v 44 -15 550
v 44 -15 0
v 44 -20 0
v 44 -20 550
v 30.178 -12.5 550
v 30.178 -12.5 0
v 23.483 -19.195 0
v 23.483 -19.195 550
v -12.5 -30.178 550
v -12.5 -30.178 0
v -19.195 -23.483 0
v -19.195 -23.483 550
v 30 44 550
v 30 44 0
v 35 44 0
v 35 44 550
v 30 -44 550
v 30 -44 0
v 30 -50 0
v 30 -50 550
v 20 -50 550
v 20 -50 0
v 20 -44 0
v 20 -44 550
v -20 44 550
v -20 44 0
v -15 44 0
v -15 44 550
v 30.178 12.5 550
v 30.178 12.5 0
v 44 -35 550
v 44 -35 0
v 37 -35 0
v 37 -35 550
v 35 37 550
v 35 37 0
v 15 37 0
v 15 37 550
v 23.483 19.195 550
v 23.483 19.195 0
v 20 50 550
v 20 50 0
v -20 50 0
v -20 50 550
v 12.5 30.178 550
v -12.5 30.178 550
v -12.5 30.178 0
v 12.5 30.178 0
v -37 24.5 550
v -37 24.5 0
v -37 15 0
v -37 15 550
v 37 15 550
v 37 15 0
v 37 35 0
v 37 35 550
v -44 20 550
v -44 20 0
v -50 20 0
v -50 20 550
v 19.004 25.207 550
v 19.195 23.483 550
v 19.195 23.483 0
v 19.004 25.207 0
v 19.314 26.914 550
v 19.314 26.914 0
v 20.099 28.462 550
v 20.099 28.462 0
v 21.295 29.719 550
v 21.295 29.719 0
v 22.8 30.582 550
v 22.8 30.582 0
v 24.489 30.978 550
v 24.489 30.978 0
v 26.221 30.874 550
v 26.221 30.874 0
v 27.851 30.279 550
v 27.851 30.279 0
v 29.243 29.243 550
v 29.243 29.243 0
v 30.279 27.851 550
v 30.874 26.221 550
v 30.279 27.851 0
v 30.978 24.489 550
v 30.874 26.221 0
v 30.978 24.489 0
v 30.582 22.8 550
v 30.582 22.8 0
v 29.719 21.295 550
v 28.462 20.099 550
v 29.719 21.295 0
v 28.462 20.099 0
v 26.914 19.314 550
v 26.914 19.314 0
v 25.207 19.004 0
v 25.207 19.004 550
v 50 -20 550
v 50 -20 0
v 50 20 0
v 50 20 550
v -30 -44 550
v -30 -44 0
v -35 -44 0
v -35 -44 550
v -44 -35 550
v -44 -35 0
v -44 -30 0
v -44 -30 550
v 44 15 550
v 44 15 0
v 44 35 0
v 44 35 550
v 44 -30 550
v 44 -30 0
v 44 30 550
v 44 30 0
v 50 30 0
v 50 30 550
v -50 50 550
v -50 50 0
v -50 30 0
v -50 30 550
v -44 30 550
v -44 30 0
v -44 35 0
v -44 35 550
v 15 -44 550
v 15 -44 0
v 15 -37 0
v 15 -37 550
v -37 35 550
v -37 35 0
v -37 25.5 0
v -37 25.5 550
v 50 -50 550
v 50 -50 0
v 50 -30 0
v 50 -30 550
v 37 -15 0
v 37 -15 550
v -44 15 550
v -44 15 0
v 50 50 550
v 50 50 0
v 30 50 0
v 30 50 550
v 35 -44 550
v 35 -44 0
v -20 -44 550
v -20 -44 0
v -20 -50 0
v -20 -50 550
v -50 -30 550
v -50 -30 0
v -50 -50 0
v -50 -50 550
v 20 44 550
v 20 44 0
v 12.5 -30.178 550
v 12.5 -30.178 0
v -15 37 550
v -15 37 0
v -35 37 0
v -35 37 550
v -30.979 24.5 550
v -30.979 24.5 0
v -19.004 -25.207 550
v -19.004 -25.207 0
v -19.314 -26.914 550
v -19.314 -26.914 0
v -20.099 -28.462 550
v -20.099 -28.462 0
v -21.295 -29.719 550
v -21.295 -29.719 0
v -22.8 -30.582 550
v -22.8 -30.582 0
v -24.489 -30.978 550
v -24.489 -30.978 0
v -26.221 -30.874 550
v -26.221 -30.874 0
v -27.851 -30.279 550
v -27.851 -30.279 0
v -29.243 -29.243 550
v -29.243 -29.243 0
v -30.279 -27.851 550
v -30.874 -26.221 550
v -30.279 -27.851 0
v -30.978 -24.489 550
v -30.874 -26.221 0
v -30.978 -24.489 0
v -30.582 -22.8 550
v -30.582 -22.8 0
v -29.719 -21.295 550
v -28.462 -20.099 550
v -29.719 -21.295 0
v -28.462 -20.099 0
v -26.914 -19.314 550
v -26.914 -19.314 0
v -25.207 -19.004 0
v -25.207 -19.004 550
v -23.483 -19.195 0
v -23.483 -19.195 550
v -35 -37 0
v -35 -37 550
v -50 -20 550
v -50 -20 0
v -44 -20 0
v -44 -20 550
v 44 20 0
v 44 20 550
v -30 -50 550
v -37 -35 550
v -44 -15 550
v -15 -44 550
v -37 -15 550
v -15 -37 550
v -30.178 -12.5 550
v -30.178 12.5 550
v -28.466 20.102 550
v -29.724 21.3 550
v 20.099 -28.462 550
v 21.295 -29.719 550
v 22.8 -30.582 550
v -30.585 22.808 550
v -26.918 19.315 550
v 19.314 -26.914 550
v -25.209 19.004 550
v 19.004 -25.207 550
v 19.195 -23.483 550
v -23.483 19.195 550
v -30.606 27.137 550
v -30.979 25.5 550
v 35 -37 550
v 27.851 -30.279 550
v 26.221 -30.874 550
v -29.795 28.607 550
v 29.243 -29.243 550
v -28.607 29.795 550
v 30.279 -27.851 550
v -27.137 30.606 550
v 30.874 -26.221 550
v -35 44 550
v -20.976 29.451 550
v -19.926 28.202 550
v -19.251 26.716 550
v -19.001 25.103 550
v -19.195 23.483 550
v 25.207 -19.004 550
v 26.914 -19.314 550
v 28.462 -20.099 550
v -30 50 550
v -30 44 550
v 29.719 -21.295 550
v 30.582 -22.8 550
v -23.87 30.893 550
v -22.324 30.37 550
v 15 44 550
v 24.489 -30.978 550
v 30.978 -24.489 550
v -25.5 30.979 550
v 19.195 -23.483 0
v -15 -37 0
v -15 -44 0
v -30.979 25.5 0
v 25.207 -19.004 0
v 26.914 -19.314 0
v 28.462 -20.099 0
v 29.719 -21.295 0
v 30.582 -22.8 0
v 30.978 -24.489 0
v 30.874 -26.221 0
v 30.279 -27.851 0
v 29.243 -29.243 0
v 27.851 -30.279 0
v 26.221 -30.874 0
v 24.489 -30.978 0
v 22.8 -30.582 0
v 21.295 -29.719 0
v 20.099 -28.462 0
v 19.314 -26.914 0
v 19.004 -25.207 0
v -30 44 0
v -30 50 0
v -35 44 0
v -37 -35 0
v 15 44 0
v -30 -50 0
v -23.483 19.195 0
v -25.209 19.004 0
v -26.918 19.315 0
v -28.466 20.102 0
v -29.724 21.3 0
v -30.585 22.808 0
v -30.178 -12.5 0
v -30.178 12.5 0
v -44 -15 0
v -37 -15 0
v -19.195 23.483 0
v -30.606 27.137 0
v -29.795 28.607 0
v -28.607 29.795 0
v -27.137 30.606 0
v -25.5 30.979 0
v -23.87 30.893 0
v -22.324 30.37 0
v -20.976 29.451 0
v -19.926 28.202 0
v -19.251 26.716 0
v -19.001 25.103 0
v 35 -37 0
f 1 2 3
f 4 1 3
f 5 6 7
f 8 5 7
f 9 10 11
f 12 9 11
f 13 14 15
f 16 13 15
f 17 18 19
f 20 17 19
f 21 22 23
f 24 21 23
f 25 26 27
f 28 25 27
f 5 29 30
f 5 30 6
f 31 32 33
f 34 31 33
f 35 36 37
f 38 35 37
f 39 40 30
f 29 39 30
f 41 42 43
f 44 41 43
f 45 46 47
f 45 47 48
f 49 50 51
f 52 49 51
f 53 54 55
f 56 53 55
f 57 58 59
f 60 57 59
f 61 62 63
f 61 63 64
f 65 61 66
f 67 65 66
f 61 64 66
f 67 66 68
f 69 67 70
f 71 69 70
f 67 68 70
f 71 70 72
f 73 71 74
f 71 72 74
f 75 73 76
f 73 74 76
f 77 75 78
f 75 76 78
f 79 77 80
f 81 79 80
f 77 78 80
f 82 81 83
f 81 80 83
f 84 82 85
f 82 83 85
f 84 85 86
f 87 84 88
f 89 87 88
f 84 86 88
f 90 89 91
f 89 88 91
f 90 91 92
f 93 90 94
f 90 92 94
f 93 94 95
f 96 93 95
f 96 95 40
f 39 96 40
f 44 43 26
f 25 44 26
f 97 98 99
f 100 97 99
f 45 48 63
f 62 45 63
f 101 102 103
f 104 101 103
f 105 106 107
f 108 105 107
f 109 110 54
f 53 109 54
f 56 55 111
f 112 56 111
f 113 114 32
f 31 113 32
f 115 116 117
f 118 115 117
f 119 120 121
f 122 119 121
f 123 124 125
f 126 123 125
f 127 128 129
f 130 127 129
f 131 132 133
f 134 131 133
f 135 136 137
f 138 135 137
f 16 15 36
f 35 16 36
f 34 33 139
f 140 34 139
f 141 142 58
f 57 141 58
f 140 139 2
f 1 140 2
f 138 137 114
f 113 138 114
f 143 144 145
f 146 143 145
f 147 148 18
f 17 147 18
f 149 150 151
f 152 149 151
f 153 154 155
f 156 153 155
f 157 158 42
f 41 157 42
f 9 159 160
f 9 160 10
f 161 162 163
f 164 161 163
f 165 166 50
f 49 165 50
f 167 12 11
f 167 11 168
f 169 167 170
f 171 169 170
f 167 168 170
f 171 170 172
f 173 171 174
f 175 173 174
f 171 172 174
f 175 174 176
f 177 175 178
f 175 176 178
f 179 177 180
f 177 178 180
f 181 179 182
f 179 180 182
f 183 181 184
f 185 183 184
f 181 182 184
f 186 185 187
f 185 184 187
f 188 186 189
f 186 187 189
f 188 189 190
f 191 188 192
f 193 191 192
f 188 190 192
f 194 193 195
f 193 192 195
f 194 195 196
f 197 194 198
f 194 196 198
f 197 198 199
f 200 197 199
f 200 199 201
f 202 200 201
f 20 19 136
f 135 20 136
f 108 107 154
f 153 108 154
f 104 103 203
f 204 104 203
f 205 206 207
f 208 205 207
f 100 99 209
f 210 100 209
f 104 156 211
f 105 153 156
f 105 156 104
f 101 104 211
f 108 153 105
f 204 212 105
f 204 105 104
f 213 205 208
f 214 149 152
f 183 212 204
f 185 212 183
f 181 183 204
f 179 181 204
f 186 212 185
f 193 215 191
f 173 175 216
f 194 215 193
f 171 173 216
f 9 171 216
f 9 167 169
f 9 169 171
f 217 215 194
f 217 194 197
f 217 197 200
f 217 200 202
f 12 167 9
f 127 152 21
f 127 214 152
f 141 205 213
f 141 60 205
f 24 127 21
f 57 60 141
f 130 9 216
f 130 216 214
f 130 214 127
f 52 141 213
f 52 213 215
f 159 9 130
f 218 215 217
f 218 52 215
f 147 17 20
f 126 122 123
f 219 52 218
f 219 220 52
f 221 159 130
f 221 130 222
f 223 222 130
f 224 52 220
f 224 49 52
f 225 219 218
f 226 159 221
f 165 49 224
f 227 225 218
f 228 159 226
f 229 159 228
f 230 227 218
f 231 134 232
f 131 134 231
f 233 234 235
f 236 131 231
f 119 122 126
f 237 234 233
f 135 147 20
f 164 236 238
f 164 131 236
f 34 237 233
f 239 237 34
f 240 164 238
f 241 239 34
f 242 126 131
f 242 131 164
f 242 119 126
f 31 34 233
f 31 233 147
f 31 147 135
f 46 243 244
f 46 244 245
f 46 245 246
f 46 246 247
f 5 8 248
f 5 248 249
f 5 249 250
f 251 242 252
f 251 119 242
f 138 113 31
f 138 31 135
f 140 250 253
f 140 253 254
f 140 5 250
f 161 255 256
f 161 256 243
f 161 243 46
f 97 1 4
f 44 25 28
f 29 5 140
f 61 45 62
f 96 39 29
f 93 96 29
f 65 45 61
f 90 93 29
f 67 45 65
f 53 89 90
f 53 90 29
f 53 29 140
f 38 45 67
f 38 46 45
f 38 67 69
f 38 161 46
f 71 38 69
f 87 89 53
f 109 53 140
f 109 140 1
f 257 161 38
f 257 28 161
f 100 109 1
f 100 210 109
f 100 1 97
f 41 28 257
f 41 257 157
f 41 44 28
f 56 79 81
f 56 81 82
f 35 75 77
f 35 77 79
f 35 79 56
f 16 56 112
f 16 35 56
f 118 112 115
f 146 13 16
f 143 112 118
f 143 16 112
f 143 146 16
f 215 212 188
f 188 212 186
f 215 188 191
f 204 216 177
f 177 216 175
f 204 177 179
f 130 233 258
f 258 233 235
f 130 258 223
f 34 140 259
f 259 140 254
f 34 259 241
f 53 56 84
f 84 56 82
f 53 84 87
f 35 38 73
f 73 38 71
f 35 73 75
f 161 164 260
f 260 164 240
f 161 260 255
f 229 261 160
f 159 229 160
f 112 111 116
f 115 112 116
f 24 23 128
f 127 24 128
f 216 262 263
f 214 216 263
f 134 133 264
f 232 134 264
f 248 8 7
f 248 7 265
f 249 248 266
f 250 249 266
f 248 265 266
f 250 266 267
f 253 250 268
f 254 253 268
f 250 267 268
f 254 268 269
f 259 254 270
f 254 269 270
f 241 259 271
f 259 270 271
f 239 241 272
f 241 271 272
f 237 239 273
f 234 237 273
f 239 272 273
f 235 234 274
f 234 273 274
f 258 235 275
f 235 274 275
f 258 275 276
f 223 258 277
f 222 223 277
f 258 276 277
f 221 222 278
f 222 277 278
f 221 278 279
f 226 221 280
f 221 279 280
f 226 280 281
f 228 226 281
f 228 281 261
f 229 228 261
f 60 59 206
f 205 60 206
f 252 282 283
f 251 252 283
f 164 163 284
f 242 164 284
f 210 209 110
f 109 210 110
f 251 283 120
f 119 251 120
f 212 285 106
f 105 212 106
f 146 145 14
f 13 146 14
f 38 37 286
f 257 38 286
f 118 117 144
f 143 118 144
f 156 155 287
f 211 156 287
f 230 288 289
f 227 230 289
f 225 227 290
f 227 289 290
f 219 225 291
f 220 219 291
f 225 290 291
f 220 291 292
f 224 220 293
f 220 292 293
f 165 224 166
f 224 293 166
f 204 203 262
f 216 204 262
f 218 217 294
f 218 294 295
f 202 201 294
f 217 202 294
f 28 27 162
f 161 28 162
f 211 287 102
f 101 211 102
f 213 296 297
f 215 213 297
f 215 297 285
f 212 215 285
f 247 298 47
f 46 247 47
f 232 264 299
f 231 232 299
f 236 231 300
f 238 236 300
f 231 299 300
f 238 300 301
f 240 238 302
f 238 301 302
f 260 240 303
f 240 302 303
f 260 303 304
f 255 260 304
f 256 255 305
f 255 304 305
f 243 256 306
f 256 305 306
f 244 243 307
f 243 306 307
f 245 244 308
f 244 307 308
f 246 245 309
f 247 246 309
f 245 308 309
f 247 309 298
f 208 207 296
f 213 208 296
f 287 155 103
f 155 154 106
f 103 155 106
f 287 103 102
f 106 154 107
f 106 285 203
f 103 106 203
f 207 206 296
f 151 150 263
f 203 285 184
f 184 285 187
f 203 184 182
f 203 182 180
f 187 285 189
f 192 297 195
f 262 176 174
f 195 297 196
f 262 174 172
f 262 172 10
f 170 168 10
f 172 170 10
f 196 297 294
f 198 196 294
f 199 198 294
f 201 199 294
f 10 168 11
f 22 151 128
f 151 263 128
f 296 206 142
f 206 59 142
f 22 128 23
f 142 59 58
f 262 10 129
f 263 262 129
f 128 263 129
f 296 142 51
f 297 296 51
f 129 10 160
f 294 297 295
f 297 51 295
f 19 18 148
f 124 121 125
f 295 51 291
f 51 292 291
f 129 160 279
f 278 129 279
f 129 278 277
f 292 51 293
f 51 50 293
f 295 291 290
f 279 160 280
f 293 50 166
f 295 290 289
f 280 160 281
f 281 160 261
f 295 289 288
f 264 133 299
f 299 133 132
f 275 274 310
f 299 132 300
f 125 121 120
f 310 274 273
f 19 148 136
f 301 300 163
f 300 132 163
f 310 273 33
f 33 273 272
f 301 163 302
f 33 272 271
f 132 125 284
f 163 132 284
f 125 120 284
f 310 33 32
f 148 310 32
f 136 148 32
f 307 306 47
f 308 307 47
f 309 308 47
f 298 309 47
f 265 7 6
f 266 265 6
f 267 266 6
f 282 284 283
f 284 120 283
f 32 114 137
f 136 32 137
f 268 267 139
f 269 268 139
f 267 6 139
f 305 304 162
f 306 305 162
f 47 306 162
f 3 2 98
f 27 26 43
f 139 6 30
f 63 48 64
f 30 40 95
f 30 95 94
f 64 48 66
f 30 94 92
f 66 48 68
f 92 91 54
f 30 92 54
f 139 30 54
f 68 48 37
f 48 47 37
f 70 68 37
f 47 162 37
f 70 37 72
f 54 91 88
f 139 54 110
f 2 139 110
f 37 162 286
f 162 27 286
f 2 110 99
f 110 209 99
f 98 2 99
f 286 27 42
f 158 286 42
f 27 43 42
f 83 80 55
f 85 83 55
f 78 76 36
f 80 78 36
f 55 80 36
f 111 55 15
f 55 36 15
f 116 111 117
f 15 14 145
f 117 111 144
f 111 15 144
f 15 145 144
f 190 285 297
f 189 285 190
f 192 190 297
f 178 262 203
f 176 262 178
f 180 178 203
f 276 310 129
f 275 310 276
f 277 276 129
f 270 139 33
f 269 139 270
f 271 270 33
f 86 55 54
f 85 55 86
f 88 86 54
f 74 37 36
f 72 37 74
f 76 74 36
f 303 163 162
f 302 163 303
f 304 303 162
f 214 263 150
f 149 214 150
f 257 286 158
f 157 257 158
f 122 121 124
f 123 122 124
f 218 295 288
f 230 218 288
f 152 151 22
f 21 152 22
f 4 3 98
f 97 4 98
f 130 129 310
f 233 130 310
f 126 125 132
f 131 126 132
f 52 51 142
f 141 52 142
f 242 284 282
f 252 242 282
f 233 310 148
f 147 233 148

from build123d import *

# Parameters (mm, degrees)
F1_DEPTH = 550


with BuildPart() as f1:
    # F0 (on Top) → F1 (new body)
    with BuildSketch(Plane.XY):
        with BuildLine():
            Line((-30, 50), (-50, 50))
            Line((-50, 50), (-50, 30))
            Line((-50, 30), (-44, 30))
            Line((-44, 30), (-44, 35))
            Line((-44, 35), (-37, 35))
            Line((-37, 35), (-37, 25.5))
            Line((-37, 25.5), (-30.97913, 25.5))
            ThreePointArc((-30.97913, 25.5), (-29.242641, 29.242641), (-25.5, 30.97913))
            ThreePointArc((-25.5, 30.97913), (-20.408156, 28.861991), (-19.195037, 23.482633))
            Line((-19.195037, 23.482633), (-12.5, 30.17767))
            Line((-12.5, 30.17767), (12.5, 30.17767))
            Line((12.5, 30.17767), (19.195037, 23.482633))
            ThreePointArc((19.195037, 23.482633), (29.242641, 29.242641), (23.482633, 19.195037))
            Line((23.482633, 19.195037), (30.17767, 12.5))
            Line((30.17767, 12.5), (30.17767, -12.5))
            Line((30.17767, -12.5), (23.482633, -19.195037))
            ThreePointArc((23.482633, -19.195037), (29.242641, -29.242641), (19.195037, -23.482633))
            Line((19.195037, -23.482633), (12.5, -30.17767))
            Line((12.5, -30.17767), (-12.5, -30.17767))
            Line((-12.5, -30.17767), (-19.195037, -23.482633))
            ThreePointArc((-19.195037, -23.482633), (-29.242641, -29.242641), (-23.482633, -19.195037))
            Line((-23.482633, -19.195037), (-30.17767, -12.5))
            Line((-30.17767, -12.5), (-30.17767, 12.5))
            Line((-30.17767, 12.5), (-23.482633, 19.195037))
            ThreePointArc((-23.482633, 19.195037), (-28.465904, 20.102295), (-30.97913, 24.5))
            Line((-30.97913, 24.5), (-37, 24.5))
            Line((-37, 24.5), (-37, 15))
            Line((-37, 15), (-44, 15))
            Line((-44, 15), (-44, 20))
            Line((-44, 20), (-50, 20))
            Line((-50, 20), (-50, -20))
            Line((-50, -20), (-44, -20))
            Line((-44, -20), (-44, -15))
            Line((-44, -15), (-37, -15))
            Line((-37, -15), (-37, -35))
            Line((-37, -35), (-44, -35))
            Line((-44, -35), (-44, -30))
            Line((-44, -30), (-50, -30))
            Line((-50, -30), (-50, -50))
            Line((-50, -50), (-30, -50))
            Line((-30, -50), (-30, -44))
            Line((-30, -44), (-35, -44))
            Line((-35, -44), (-35, -37))
            Line((-35, -37), (-15, -37))
            Line((-15, -37), (-15, -44))
            Line((-15, -44), (-20, -44))
            Line((-20, -44), (-20, -50))
            Line((-20, -50), (20, -50))
            Line((20, -50), (20, -44))
            Line((20, -44), (15, -44))
            Line((15, -44), (15, -37))
            Line((15, -37), (35, -37))
            Line((35, -37), (35, -44))
            Line((35, -44), (30, -44))
            Line((30, -44), (30, -50))
            Line((30, -50), (50, -50))
            Line((50, -50), (50, -30))
            Line((50, -30), (44, -30))
            Line((44, -30), (44, -35))
            Line((44, -35), (37, -35))
            Line((37, -35), (37, -15))
            Line((37, -15), (44, -15))
            Line((44, -15), (44, -20))
            Line((44, -20), (50, -20))
            Line((50, -20), (50, 20))
            Line((50, 20), (44, 20))
            Line((44, 20), (44, 15))
            Line((44, 15), (37, 15))
            Line((37, 15), (37, 35))
            Line((37, 35), (44, 35))
            Line((44, 35), (44, 30))
            Line((44, 30), (50, 30))
            Line((50, 30), (50, 50))
            Line((50, 50), (30, 50))
            Line((30, 50), (30, 44))
            Line((30, 44), (35, 44))
            Line((35, 44), (35, 37))
            Line((35, 37), (15, 37))
            Line((15, 37), (15, 44))
            Line((15, 44), (20, 44))
            Line((20, 44), (20, 50))
            Line((20, 50), (-20, 50))
            Line((-20, 50), (-20, 44))
            Line((-20, 44), (-15, 44))
            Line((-15, 44), (-15, 37))
            Line((-15, 37), (-25.5, 37))
            Line((-25.5, 37), (-35, 37))
            Line((-35, 37), (-35, 44))
            Line((-35, 44), (-30, 44))
            Line((-30, 44), (-30, 50))
        make_face()
    extrude(amount=F1_DEPTH)


solid = f1.part
